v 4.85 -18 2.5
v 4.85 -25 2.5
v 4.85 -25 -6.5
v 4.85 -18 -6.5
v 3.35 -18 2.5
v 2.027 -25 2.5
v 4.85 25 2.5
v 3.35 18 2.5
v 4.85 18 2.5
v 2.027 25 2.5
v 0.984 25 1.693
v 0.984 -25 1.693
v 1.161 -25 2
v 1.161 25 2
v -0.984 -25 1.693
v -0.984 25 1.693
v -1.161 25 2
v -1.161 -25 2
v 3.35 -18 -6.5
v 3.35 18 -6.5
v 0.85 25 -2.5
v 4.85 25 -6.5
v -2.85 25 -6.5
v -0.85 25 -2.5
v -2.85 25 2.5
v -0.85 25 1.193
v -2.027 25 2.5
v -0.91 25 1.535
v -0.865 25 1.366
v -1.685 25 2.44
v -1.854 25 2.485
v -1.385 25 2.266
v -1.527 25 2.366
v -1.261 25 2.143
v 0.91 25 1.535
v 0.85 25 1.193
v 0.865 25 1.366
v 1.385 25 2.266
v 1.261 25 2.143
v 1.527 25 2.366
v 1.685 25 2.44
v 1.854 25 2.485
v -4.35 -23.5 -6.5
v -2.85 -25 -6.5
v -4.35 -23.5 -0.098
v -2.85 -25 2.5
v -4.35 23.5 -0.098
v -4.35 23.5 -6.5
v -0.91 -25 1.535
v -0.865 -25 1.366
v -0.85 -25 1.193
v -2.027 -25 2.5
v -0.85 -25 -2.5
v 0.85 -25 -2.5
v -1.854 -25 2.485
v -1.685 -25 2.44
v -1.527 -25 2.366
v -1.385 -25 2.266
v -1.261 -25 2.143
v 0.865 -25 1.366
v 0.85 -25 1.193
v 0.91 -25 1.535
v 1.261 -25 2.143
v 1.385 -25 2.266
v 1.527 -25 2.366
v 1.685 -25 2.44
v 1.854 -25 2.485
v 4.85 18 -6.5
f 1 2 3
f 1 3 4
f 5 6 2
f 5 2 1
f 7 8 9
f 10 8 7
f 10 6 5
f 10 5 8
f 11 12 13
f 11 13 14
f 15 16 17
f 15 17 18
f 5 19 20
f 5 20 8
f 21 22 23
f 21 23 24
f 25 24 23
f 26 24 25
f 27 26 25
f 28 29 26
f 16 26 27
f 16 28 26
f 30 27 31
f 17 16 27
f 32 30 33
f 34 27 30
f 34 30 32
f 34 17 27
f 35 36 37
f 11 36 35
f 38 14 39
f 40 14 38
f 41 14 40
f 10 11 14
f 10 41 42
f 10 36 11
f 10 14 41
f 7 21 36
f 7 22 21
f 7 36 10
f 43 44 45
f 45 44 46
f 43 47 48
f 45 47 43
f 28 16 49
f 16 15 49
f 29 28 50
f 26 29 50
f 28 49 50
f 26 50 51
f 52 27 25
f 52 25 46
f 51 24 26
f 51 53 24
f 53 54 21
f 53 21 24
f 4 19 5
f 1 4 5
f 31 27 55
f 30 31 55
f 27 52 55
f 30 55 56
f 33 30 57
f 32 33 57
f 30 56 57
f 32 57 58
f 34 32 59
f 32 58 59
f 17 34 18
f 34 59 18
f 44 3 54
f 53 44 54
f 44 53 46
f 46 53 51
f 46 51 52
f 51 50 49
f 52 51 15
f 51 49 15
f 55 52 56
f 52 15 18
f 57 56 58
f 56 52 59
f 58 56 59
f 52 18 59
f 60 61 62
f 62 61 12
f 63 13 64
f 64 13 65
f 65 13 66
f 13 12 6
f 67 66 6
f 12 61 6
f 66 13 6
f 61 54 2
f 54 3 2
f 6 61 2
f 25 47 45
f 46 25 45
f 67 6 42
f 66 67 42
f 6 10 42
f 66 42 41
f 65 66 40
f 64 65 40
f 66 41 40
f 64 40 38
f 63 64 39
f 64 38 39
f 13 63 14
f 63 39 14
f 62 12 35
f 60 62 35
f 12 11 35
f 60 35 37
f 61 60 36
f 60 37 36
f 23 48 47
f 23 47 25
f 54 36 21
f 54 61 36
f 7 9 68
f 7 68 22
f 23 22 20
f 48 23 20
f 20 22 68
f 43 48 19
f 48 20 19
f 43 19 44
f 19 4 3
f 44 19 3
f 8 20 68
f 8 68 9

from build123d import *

# Parameters (mm, degrees)
F1_DEPTH = 25
F2_SIZE2 = 1.0392304845
F2_SIZE  = 0.6
F3_SIZE2 = 1.0392304845
F3_SIZE  = 0.6
F4_W     = 7
F4_H     = 9
F5_DEPTH = 1.5
F6_W     = 50
F6_H     = 9
F7_DEPTH = 1
F8_SIZE2 = 2.5980762114
F8_SIZE  = 1.5
F9_SIZE  = 1.5
F10_R    = 1


with BuildPart() as f1:
    # F0 (on Front) → F1 (new body, symmetric)
    with BuildSketch(Plane.XZ):
        Polygon((0.85, 2.5), (0.85, -2.5), (-0.85, -2.5), (-0.85, 2.5), (-3.35, 2.5), (-3.35, -6.5), (3.35, -6.5), (3.35, 2.5), align=None)
    extrude(amount=F1_DEPTH, both=True)

    # F2
    f2_edges = [f1.edges().sort_by_distance(p)[0] for p in [
        (-0.85, 0, 2.5),
    ]]
    f2_side = f1.faces().sort_by_distance((-2.1, 0, 2.5))[0]
    chamfer(f2_edges, length=F2_SIZE, length2=F2_SIZE2, reference=f2_side)

    # F3
    f3_edges = [f1.edges().sort_by_distance(p)[0] for p in [
        (0.85, 0, 2.5),
    ]]
    f3_side = f1.faces().sort_by_distance((2.1, 0, 2.5))[0]
    chamfer(f3_edges, length=F3_SIZE, length2=F3_SIZE2, reference=f3_side)

    # F4 (on face) → F5 (join)
    with BuildSketch(Plane.YZ.offset(3.35)):
        with Locations((-21.5, -2)):
            Rectangle(F4_W, F4_H)
        with Locations((21.5, -2)):
            Rectangle(F4_W, F4_H)
    extrude(amount=F5_DEPTH)

    # F6 (on face) → F7 (join)
    with BuildSketch(Plane(origin=(-3.35, 0, 0), x_dir=(0, -1, 0), z_dir=(-1, 0, 0))):
        with Locations((0, -2)):
            Rectangle(F6_W, F6_H)
    extrude(amount=F7_DEPTH)

    # F8
    f8_edges = [f1.edges().sort_by_distance(p)[0] for p in [
        (-4.35, 0, 2.5),
    ]]
    f8_side = f1.faces().sort_by_distance((-2.9, 0, 2.5))[0]
    chamfer(f8_edges, length=F8_SIZE, length2=F8_SIZE2, reference=f8_side)

    # F9
    f9_edges = [f1.edges().sort_by_distance(p)[0] for p in [
        (-4.35, -25, -3.299038),
        (-4.35, 25, -3.299038),
    ]]
    chamfer(f9_edges, length=F9_SIZE)

    # F10
    f10_edges = [f1.edges().sort_by_distance(p)[0] for p in [
        (-0.85, 0, 1.46077),
        (-1.45, 0, 2.5),
        (1.45, 0, 2.5),
        (0.85, 0, 1.46077),
    ]]
    fillet(f10_edges, radius=F10_R)


solid = f1.part
